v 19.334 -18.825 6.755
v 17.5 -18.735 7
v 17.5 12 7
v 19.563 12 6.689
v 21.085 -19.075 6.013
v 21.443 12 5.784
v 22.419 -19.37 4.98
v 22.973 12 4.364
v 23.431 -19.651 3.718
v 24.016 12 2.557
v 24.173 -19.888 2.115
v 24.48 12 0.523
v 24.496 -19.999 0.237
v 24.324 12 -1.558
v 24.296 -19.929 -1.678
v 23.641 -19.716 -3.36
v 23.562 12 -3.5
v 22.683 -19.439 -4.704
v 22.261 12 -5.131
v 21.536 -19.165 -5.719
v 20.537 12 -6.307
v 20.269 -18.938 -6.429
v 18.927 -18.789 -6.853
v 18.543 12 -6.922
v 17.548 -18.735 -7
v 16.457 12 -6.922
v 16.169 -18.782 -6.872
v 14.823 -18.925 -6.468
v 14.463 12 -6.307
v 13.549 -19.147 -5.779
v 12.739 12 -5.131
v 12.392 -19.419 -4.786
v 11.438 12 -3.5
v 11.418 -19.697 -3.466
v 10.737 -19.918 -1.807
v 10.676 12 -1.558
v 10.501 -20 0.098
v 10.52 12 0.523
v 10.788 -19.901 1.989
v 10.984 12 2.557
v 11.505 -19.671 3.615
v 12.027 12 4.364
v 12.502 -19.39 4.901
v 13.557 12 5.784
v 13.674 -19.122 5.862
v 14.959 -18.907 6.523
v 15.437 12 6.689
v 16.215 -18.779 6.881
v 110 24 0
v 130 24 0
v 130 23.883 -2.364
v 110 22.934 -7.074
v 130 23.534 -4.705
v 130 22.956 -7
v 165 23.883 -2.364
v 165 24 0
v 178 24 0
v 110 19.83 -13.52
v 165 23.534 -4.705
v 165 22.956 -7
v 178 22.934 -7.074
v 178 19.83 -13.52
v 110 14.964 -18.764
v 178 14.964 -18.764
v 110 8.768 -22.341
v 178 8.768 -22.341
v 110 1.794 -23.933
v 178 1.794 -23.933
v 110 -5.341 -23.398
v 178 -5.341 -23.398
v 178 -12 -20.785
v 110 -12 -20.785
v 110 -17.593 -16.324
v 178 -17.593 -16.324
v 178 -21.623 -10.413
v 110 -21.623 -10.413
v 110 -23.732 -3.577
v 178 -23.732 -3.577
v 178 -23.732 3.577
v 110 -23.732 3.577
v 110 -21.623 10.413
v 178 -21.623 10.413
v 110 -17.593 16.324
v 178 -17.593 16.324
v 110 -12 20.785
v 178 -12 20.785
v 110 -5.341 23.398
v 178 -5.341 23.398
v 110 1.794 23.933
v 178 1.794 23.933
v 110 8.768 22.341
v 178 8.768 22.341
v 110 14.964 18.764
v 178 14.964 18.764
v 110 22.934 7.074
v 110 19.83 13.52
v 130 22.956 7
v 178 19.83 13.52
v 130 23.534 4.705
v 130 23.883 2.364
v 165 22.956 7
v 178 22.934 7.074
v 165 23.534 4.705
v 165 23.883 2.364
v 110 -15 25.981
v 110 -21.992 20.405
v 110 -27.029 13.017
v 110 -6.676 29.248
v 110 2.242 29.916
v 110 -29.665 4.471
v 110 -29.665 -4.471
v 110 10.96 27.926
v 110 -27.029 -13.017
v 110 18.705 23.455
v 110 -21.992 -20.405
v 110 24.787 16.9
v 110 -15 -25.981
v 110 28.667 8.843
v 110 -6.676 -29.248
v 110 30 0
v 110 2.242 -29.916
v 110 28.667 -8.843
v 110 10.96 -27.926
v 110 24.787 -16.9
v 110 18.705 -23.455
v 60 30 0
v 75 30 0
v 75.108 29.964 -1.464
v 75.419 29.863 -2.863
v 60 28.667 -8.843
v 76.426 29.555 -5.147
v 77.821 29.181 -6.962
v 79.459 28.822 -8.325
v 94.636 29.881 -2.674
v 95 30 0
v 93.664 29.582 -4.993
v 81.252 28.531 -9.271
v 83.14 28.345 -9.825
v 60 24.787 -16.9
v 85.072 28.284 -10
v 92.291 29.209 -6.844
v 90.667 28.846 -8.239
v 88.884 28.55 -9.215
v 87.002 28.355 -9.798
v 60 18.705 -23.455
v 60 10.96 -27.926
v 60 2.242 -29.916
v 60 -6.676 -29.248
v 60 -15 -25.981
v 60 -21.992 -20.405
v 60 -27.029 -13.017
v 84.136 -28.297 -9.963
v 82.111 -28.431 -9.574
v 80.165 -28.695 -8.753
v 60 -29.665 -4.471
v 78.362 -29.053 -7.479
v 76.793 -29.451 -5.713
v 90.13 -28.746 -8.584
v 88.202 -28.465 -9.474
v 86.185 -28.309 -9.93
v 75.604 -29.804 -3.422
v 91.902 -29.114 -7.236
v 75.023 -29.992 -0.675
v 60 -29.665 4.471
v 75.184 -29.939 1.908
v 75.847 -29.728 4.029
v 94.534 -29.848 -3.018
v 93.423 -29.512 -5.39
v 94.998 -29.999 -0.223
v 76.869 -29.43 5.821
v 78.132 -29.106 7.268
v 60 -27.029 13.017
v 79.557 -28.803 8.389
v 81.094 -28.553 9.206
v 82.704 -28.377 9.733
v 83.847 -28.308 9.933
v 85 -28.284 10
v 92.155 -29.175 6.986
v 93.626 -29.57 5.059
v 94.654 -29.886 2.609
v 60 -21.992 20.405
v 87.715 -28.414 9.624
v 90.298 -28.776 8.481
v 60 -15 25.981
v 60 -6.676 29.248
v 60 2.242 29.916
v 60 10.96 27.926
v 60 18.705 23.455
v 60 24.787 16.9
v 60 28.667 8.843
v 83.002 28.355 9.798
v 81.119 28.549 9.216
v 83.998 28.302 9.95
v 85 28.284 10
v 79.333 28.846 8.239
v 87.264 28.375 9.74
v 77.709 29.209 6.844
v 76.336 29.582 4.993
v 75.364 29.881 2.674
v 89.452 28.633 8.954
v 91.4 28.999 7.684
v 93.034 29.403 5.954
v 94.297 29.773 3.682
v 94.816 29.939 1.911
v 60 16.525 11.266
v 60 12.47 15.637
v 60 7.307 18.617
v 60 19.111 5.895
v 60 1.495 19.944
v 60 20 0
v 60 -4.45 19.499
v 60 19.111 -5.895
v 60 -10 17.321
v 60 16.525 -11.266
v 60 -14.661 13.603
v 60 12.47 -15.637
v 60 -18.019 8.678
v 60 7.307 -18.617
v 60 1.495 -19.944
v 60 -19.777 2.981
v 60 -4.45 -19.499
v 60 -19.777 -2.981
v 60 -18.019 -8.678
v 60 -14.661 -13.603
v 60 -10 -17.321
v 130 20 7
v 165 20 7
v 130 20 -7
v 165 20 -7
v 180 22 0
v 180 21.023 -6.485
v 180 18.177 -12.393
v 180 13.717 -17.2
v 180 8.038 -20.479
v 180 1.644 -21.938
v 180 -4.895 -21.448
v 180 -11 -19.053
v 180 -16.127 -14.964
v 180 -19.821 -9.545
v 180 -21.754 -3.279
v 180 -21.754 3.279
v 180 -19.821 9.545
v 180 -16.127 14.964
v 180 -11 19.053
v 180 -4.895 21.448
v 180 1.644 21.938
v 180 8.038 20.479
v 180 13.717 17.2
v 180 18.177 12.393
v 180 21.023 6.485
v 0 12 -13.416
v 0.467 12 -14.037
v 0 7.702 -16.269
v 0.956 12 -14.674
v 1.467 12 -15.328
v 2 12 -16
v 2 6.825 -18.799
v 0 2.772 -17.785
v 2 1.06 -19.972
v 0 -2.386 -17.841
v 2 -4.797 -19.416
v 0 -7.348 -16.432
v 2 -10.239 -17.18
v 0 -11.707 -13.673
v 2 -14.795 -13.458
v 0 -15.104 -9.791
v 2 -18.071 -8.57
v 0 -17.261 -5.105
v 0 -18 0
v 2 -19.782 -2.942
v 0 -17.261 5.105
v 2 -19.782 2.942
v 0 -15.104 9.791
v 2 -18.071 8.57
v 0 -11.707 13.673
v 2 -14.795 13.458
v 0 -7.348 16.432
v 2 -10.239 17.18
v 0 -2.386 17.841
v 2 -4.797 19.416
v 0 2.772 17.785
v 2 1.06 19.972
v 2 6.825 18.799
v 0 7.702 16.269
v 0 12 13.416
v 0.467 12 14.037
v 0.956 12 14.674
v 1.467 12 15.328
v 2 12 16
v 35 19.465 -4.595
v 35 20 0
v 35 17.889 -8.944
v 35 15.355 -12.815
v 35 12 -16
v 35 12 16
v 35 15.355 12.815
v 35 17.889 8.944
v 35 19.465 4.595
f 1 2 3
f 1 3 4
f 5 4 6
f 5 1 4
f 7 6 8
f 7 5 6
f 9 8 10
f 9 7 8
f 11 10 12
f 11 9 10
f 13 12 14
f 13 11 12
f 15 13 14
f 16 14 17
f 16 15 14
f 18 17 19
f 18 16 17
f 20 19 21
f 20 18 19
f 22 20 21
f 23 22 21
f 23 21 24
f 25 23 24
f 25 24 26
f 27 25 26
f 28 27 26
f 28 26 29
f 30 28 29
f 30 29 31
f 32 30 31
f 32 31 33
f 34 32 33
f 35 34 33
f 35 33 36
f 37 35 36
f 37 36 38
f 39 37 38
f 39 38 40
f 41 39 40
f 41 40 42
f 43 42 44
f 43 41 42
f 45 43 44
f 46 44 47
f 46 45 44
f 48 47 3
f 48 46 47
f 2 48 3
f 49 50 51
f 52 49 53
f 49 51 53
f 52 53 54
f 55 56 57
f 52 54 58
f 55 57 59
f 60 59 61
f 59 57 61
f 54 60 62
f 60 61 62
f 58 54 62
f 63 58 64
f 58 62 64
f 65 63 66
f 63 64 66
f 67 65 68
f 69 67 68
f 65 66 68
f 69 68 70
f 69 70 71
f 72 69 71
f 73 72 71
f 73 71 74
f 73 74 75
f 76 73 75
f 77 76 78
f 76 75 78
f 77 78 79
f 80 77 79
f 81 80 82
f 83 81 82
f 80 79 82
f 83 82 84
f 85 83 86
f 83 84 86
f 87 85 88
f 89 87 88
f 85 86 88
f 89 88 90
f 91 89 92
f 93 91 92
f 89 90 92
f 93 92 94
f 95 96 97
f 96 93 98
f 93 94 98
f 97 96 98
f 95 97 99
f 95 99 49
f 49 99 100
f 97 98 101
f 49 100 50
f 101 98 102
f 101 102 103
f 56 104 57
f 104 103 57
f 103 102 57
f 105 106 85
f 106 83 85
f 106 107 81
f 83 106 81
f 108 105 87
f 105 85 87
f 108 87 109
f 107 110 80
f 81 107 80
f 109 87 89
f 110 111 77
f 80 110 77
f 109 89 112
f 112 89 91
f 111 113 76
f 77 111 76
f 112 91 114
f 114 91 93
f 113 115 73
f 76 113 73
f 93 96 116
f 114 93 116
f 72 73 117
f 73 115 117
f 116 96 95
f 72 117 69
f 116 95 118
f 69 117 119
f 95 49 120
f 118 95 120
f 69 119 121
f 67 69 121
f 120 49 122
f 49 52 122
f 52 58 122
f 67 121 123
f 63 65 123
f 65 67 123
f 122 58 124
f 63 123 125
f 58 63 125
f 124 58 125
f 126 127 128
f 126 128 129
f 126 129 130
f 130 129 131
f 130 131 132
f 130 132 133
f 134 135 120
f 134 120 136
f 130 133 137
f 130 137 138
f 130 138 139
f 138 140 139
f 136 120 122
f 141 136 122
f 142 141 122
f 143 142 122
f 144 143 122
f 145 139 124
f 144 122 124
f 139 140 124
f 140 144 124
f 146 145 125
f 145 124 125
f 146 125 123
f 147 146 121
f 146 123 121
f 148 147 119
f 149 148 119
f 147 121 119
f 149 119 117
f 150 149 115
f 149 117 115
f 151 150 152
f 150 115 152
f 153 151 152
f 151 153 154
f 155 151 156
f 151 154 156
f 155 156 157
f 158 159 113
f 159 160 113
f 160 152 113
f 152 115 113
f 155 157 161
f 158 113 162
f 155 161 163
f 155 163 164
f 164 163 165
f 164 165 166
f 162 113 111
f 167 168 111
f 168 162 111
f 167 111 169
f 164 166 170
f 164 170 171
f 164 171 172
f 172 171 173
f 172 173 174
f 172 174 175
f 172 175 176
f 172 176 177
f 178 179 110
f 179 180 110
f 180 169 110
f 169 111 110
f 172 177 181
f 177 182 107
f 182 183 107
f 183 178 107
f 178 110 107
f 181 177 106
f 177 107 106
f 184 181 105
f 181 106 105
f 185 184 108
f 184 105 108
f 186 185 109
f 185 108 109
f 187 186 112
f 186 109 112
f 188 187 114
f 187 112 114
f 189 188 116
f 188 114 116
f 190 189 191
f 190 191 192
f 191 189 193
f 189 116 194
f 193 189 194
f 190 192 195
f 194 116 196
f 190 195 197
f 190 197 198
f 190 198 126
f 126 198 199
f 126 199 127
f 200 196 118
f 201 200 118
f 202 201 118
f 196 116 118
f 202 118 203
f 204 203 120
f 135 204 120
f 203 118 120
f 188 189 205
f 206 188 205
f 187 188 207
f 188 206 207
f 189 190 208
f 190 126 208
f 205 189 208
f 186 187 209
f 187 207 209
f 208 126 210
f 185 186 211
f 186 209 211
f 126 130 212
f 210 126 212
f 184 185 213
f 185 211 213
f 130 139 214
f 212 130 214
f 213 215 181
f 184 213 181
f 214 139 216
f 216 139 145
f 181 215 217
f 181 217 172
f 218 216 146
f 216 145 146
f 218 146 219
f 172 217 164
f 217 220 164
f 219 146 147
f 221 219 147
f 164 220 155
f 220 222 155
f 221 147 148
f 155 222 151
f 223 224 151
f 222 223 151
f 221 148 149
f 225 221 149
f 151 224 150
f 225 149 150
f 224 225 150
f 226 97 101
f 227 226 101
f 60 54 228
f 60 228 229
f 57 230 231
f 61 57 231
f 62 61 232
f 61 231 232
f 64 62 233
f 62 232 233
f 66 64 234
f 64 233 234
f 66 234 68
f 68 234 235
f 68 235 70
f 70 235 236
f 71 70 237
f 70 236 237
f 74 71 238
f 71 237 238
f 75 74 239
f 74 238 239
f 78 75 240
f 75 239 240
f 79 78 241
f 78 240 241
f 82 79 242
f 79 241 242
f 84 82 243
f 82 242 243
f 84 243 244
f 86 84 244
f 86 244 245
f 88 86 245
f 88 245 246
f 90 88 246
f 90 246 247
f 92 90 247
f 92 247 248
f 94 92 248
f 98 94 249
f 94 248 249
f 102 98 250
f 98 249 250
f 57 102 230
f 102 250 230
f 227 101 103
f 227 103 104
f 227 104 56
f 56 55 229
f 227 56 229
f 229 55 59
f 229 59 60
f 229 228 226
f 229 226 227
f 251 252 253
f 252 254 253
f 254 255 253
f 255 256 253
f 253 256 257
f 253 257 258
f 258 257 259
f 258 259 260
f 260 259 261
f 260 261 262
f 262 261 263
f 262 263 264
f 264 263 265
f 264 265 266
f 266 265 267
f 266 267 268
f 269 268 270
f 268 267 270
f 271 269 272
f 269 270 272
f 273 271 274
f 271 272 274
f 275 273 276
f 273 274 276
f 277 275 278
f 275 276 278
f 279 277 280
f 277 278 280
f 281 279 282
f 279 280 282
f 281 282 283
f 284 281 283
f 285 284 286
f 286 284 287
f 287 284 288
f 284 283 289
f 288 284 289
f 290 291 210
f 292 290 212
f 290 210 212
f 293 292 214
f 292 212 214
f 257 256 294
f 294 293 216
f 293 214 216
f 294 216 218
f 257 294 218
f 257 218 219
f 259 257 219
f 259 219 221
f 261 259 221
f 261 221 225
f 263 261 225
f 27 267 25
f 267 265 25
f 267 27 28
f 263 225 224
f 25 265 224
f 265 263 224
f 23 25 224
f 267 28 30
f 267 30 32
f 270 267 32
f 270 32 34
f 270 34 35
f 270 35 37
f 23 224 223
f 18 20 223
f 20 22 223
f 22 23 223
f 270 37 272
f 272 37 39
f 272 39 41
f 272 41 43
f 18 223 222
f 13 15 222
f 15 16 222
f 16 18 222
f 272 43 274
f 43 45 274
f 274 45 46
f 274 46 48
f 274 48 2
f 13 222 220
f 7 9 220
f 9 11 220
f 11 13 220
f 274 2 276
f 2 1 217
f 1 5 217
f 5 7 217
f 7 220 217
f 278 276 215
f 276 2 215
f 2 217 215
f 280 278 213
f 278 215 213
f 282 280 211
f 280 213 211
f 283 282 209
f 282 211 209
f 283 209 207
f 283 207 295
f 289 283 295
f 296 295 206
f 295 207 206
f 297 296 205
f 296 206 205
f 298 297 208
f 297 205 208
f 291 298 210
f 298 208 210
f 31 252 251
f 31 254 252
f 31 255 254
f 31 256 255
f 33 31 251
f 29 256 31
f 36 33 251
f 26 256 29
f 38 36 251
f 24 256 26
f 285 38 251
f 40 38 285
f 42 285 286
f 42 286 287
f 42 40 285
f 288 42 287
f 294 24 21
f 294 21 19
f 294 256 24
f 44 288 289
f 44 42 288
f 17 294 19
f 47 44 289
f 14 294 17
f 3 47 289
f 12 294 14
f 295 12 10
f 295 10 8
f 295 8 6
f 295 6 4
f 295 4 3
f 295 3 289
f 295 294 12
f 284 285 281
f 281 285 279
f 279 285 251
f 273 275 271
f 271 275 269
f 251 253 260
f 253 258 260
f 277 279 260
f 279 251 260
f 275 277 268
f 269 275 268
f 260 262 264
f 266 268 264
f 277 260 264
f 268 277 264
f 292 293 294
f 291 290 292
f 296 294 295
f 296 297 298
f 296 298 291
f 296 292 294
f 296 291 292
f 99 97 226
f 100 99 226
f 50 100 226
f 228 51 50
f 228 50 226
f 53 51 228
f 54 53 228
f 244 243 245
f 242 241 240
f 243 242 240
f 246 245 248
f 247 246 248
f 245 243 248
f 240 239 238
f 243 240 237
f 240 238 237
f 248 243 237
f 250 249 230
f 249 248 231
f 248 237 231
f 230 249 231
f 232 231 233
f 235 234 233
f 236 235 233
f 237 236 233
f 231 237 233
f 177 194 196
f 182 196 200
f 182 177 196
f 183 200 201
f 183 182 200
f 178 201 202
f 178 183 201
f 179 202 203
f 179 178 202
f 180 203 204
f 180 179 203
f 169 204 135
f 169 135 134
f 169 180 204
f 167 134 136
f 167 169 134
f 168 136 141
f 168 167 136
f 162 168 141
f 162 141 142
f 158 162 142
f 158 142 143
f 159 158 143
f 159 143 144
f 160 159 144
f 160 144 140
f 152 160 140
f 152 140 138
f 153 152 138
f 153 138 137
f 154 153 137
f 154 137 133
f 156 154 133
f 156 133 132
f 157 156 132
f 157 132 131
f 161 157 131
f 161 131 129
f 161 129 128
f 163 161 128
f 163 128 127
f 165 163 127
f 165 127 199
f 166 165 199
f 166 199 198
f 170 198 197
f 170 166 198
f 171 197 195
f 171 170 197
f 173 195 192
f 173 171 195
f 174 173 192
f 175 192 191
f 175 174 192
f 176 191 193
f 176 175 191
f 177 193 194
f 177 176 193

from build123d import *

# Parameters (mm, degrees)
CUT_EXTRUDE_START        = -35
CUT_EXTRUDE_1_DEPTH      = 35
CUT_EXTRUDE_2_DEPTH      = 185.932420089
CUT_EXTRUDE_2_DEPTH_BACK = 185.932420089
SKETCH_4_R               = 7
SKETCH_4_R_2             = 10
SKETCH_5_W               = 35
SKETCH_5_H               = 14
CUT_EXTRUDE_3_DEPTH      = 4
CHAMFER_1_SIZE           = 2


with BuildPart() as part:
    # Эскиз2 → Повернуть1 (revolve)
    with BuildSketch(Plane.XY):
        Polygon((0, 0), (0, 20), (60, 20), (60, 30), (110, 30), (110, 24), (180, 24), (180, 0), align=None)
    revolve(axis=Axis((180, 0, 0), (-1, 0, 0)))

    # Эскиз3 → Вырез-Вытянуть1 (cut)
    with BuildSketch(Plane.ZY.offset(CUT_EXTRUDE_START)):
        with BuildLine():
            Line((-16, 12), (16, 12))
            ThreePointArc((16, 12), (0, 20), (-16, 12))
        make_face()
    extrude(amount=CUT_EXTRUDE_1_DEPTH, mode=Mode.SUBTRACT)

    # Эскиз4 → Вырез-Вытянуть2 (cut, two sides: drawn at the far end of the back side and taken through both)
    with BuildSketch(Plane(origin=(0, 0, 0), x_dir=(1, 0, 0), z_dir=(0, 1, 0)).offset(-CUT_EXTRUDE_2_DEPTH_BACK)):
        with Locations(Location((17.5, 0, 0), (0, 0, 270))):
            Circle(SKETCH_4_R)
        with Locations(Location((85, 0, 0), (0, 0, 270))):
            Circle(SKETCH_4_R_2)
    extrude(amount=CUT_EXTRUDE_2_DEPTH + CUT_EXTRUDE_2_DEPTH_BACK, mode=Mode.SUBTRACT)

    # Эскиз5 → Вырез-Вытянуть3 (cut)
    with BuildSketch(Plane(origin=(0, 24, 0), x_dir=(1, 0, 0), z_dir=(0, 1, 0))):
        with Locations((147.5, 0)):
            Rectangle(SKETCH_5_W, SKETCH_5_H)
    extrude(amount=-CUT_EXTRUDE_3_DEPTH, mode=Mode.SUBTRACT)

    # Фаска1
    chamfer_1_edges = [part.edges().sort_by_distance(p)[0] for p in [
        (180, -24, 0),
        (0, -20, 0),
    ]]
    chamfer(chamfer_1_edges, length=CHAMFER_1_SIZE)


solid = part.part
